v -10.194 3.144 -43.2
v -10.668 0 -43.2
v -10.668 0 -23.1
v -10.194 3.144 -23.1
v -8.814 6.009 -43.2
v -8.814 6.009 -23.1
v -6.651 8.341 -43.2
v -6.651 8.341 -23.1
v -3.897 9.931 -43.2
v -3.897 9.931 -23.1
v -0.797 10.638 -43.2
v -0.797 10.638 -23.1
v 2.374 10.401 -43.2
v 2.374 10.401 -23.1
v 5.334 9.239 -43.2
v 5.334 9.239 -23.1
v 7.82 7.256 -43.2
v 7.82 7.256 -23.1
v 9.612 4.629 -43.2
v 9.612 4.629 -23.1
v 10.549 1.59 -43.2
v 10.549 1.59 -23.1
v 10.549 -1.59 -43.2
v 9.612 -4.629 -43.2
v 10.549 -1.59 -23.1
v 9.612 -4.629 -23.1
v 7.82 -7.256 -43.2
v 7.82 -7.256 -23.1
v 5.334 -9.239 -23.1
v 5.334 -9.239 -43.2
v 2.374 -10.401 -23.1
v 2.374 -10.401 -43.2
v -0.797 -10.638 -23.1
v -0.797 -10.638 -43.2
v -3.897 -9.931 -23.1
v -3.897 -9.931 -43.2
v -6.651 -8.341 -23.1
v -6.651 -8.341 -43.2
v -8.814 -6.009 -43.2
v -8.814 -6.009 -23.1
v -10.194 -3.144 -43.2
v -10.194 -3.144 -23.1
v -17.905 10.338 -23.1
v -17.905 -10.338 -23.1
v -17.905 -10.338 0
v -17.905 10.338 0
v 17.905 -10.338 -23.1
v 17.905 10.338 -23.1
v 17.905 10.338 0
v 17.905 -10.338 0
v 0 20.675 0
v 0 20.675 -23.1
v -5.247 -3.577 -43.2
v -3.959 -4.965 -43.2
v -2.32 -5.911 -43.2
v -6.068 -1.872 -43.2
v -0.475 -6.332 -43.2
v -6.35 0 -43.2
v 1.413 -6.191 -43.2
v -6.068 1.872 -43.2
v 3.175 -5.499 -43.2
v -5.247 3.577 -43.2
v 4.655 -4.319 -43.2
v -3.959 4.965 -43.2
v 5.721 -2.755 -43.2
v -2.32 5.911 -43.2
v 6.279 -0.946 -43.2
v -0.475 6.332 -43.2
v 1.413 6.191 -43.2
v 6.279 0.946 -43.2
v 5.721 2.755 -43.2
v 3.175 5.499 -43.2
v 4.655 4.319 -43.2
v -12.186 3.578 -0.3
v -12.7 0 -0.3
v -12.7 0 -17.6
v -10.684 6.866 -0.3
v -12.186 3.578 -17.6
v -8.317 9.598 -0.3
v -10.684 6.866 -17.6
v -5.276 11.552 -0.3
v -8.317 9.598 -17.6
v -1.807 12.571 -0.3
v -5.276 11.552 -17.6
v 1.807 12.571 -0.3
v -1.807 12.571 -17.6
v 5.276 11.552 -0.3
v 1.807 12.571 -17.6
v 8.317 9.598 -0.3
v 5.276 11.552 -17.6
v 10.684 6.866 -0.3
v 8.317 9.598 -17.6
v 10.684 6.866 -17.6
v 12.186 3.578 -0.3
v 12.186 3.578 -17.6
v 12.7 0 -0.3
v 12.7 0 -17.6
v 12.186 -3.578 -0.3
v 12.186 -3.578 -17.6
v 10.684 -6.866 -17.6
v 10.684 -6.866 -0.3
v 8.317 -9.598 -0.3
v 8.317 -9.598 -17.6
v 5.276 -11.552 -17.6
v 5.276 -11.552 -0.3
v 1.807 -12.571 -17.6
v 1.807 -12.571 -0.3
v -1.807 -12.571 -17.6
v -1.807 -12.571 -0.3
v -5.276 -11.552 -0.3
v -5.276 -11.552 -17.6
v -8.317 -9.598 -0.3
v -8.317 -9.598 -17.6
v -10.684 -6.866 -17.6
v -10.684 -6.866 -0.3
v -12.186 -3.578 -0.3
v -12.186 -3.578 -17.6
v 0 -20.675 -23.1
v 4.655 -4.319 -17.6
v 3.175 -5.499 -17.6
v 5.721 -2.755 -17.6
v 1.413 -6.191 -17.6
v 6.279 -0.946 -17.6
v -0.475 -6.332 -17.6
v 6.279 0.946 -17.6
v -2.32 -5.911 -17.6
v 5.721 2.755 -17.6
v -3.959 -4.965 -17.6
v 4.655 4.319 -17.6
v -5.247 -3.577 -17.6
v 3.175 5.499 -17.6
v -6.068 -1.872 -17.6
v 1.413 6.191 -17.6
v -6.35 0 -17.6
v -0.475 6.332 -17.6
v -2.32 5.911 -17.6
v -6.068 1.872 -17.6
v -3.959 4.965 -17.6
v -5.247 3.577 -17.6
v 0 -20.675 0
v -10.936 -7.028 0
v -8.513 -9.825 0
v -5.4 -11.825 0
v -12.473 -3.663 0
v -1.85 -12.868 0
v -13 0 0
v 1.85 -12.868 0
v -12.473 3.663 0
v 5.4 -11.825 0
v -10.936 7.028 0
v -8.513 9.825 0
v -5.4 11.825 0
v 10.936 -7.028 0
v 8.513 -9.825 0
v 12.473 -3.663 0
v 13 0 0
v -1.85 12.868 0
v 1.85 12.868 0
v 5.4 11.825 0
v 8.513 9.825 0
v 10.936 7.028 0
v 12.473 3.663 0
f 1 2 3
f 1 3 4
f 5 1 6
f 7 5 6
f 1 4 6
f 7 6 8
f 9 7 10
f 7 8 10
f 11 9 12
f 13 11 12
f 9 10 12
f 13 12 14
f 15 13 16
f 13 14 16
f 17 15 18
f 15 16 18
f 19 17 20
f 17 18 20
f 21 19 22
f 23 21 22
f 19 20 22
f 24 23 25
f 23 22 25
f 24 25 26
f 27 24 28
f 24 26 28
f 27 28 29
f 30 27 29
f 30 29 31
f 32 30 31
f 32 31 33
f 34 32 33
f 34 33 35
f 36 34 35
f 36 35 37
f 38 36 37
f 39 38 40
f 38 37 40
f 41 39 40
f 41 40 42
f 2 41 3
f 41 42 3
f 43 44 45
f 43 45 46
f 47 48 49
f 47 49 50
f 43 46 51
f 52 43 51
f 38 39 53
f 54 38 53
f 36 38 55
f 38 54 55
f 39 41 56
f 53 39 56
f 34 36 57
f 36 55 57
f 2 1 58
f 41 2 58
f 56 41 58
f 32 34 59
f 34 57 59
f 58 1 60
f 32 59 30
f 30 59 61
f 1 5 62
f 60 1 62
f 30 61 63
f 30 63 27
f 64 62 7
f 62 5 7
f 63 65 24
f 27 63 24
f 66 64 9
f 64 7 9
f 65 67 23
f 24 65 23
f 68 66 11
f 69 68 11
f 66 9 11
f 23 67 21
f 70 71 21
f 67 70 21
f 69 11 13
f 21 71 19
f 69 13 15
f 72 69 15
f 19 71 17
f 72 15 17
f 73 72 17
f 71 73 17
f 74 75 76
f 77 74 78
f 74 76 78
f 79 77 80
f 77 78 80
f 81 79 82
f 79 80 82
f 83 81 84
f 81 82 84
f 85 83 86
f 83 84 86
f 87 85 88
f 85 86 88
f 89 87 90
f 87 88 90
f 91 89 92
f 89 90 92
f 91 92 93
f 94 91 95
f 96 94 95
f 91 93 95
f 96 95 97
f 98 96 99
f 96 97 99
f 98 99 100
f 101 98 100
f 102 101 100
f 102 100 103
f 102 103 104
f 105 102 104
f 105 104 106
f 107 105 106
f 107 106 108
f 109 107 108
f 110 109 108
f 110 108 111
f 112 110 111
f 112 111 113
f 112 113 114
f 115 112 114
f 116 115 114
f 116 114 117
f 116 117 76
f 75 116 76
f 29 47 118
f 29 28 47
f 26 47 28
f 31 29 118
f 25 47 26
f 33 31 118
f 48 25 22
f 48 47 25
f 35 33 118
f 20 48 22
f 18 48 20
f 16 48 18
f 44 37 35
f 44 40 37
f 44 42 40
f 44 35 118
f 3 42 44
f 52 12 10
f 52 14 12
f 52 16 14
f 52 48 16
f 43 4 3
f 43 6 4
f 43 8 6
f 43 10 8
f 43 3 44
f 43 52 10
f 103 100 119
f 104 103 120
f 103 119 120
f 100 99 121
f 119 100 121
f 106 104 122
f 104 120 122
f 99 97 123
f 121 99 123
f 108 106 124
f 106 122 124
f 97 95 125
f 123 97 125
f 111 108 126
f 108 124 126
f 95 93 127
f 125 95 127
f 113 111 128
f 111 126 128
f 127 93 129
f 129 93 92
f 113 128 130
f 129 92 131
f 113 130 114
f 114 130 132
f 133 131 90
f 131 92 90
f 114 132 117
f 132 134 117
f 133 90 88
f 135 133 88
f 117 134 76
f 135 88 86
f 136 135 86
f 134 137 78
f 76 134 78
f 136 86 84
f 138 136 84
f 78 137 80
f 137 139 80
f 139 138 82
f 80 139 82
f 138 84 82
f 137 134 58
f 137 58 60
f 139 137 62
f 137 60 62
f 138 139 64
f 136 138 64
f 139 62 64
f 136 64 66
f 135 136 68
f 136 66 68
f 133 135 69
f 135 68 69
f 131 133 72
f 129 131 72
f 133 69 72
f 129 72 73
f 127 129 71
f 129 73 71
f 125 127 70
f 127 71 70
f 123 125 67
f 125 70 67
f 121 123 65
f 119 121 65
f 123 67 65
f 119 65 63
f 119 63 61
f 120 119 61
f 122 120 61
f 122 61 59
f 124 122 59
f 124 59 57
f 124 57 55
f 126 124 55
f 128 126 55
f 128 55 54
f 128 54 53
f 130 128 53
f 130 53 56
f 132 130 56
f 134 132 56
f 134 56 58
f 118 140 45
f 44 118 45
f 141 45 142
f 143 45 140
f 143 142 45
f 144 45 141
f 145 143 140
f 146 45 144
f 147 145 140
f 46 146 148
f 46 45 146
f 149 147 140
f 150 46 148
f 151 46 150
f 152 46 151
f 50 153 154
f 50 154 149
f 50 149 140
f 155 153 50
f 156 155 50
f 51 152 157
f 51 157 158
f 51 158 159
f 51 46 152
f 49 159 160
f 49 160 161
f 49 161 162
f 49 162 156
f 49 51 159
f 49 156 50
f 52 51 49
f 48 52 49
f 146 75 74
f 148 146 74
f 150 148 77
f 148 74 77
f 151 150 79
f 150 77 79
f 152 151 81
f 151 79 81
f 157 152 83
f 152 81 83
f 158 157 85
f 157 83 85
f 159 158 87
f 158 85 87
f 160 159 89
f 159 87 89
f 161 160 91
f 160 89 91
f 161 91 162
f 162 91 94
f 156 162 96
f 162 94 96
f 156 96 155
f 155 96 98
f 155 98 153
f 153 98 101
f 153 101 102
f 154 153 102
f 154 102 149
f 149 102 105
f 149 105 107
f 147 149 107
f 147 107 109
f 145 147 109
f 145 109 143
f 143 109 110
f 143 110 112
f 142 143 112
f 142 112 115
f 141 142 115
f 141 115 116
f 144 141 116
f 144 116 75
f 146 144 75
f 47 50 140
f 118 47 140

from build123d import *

# Parameters (mm, degrees)
SCHIZZO10_R                  = 20.675
ESTRUSIONE_ESTRUSIONE5_DEPTH = 43.2
TAGLIO_ESTRUSIONE11_DEPTH    = 23.1
FORO_25_5_25_4_1_D           = 25.4
FORO_25_5_25_4_1_DEPTH       = 17.6
FORO_25_5_25_4_1_CSINK_D     = 26
FORO_25_5_25_4_1_CSINK_ANGLE = 90
FORO_25_5_12_7_1_D           = 12.7
TAGLIO_ESTRUSIONE12_START    = -20.1
SCHIZZO24_R                  = 20.675
SCHIZZO24_R_2                = 10.668
TAGLIO_ESTRUSIONE12_DEPTH    = 20.1


with BuildPart() as part:
    # Schizzo10 → Estrusione-Estrusione5 (new body)
    with BuildSketch(Plane.XY):
        Circle(SCHIZZO10_R)
    extrude(amount=-ESTRUSIONE_ESTRUSIONE5_DEPTH)

    # Schizzo16 → Taglio-Estrusione11 (cut)
    with BuildSketch(Plane.XY):
        with BuildLine():
            Line((-17.905075223, 10.3375), (0, 20.675))
            ThreePointArc((0, 20.675), (-10.3375, 17.905075223), (-17.905075223, 10.3375))
        make_face()
        with BuildLine():
            ThreePointArc((17.905075223, 10.3375), (10.3375, 17.905075223), (0, 20.675))
            Line((0, 20.675), (17.905075223, 10.3375))
        make_face()
        with BuildLine():
            Line((-17.905075223, -10.3375), (-17.905075223, 10.3375))
            ThreePointArc((-17.905075223, 10.3375), (-20.675, 0), (-17.905075223, -10.3375))
        make_face()
        with BuildLine():
            Line((0, -20.675), (-17.905075223, -10.3375))
            ThreePointArc((-17.905075223, -10.3375), (-10.3375, -17.905075223), (0, -20.675))
        make_face()
        with BuildLine():
            ThreePointArc((0, -20.675), (10.3375, -17.905075223), (17.905075223, -10.3375))
            Line((17.905075223, -10.3375), (0, -20.675))
        make_face()
        with BuildLine():
            ThreePointArc((20.675, 0), (19.970516459, 5.351083757), (17.905075223, 10.3375))
            Line((17.905075223, 10.3375), (17.905075223, -10.3375))
            ThreePointArc((17.905075223, -10.3375), (19.970516459, -5.351083757), (20.675, 0))
        make_face()
    extrude(amount=-TAGLIO_ESTRUSIONE11_DEPTH, mode=Mode.SUBTRACT)

    # Foro Ø25.5 (25.4)-1
    with Locations(Plane.XY):
        with Locations((0, 0)):
            CounterSinkHole(FORO_25_5_25_4_1_D / 2, FORO_25_5_25_4_1_CSINK_D / 2, depth=FORO_25_5_25_4_1_DEPTH, counter_sink_angle=FORO_25_5_25_4_1_CSINK_ANGLE)

    # Foro Ø25.5 (12.7)-1 (through all)
    with Locations(Plane.XY.offset(-17.6)):
        with Locations((0, 0)):
            Hole(FORO_25_5_12_7_1_D / 2)

    # Schizzo24 → Taglio-Estrusione12 (cut)
    with BuildSketch(Plane(origin=(0, 0, -43.2), x_dir=(-1, 0, 0), z_dir=(0, 0, -1)).offset(TAGLIO_ESTRUSIONE12_START)):
        Circle(SCHIZZO24_R)
        Circle(SCHIZZO24_R_2, mode=Mode.SUBTRACT)
    extrude(amount=TAGLIO_ESTRUSIONE12_DEPTH, mode=Mode.SUBTRACT)


solid = part.part
